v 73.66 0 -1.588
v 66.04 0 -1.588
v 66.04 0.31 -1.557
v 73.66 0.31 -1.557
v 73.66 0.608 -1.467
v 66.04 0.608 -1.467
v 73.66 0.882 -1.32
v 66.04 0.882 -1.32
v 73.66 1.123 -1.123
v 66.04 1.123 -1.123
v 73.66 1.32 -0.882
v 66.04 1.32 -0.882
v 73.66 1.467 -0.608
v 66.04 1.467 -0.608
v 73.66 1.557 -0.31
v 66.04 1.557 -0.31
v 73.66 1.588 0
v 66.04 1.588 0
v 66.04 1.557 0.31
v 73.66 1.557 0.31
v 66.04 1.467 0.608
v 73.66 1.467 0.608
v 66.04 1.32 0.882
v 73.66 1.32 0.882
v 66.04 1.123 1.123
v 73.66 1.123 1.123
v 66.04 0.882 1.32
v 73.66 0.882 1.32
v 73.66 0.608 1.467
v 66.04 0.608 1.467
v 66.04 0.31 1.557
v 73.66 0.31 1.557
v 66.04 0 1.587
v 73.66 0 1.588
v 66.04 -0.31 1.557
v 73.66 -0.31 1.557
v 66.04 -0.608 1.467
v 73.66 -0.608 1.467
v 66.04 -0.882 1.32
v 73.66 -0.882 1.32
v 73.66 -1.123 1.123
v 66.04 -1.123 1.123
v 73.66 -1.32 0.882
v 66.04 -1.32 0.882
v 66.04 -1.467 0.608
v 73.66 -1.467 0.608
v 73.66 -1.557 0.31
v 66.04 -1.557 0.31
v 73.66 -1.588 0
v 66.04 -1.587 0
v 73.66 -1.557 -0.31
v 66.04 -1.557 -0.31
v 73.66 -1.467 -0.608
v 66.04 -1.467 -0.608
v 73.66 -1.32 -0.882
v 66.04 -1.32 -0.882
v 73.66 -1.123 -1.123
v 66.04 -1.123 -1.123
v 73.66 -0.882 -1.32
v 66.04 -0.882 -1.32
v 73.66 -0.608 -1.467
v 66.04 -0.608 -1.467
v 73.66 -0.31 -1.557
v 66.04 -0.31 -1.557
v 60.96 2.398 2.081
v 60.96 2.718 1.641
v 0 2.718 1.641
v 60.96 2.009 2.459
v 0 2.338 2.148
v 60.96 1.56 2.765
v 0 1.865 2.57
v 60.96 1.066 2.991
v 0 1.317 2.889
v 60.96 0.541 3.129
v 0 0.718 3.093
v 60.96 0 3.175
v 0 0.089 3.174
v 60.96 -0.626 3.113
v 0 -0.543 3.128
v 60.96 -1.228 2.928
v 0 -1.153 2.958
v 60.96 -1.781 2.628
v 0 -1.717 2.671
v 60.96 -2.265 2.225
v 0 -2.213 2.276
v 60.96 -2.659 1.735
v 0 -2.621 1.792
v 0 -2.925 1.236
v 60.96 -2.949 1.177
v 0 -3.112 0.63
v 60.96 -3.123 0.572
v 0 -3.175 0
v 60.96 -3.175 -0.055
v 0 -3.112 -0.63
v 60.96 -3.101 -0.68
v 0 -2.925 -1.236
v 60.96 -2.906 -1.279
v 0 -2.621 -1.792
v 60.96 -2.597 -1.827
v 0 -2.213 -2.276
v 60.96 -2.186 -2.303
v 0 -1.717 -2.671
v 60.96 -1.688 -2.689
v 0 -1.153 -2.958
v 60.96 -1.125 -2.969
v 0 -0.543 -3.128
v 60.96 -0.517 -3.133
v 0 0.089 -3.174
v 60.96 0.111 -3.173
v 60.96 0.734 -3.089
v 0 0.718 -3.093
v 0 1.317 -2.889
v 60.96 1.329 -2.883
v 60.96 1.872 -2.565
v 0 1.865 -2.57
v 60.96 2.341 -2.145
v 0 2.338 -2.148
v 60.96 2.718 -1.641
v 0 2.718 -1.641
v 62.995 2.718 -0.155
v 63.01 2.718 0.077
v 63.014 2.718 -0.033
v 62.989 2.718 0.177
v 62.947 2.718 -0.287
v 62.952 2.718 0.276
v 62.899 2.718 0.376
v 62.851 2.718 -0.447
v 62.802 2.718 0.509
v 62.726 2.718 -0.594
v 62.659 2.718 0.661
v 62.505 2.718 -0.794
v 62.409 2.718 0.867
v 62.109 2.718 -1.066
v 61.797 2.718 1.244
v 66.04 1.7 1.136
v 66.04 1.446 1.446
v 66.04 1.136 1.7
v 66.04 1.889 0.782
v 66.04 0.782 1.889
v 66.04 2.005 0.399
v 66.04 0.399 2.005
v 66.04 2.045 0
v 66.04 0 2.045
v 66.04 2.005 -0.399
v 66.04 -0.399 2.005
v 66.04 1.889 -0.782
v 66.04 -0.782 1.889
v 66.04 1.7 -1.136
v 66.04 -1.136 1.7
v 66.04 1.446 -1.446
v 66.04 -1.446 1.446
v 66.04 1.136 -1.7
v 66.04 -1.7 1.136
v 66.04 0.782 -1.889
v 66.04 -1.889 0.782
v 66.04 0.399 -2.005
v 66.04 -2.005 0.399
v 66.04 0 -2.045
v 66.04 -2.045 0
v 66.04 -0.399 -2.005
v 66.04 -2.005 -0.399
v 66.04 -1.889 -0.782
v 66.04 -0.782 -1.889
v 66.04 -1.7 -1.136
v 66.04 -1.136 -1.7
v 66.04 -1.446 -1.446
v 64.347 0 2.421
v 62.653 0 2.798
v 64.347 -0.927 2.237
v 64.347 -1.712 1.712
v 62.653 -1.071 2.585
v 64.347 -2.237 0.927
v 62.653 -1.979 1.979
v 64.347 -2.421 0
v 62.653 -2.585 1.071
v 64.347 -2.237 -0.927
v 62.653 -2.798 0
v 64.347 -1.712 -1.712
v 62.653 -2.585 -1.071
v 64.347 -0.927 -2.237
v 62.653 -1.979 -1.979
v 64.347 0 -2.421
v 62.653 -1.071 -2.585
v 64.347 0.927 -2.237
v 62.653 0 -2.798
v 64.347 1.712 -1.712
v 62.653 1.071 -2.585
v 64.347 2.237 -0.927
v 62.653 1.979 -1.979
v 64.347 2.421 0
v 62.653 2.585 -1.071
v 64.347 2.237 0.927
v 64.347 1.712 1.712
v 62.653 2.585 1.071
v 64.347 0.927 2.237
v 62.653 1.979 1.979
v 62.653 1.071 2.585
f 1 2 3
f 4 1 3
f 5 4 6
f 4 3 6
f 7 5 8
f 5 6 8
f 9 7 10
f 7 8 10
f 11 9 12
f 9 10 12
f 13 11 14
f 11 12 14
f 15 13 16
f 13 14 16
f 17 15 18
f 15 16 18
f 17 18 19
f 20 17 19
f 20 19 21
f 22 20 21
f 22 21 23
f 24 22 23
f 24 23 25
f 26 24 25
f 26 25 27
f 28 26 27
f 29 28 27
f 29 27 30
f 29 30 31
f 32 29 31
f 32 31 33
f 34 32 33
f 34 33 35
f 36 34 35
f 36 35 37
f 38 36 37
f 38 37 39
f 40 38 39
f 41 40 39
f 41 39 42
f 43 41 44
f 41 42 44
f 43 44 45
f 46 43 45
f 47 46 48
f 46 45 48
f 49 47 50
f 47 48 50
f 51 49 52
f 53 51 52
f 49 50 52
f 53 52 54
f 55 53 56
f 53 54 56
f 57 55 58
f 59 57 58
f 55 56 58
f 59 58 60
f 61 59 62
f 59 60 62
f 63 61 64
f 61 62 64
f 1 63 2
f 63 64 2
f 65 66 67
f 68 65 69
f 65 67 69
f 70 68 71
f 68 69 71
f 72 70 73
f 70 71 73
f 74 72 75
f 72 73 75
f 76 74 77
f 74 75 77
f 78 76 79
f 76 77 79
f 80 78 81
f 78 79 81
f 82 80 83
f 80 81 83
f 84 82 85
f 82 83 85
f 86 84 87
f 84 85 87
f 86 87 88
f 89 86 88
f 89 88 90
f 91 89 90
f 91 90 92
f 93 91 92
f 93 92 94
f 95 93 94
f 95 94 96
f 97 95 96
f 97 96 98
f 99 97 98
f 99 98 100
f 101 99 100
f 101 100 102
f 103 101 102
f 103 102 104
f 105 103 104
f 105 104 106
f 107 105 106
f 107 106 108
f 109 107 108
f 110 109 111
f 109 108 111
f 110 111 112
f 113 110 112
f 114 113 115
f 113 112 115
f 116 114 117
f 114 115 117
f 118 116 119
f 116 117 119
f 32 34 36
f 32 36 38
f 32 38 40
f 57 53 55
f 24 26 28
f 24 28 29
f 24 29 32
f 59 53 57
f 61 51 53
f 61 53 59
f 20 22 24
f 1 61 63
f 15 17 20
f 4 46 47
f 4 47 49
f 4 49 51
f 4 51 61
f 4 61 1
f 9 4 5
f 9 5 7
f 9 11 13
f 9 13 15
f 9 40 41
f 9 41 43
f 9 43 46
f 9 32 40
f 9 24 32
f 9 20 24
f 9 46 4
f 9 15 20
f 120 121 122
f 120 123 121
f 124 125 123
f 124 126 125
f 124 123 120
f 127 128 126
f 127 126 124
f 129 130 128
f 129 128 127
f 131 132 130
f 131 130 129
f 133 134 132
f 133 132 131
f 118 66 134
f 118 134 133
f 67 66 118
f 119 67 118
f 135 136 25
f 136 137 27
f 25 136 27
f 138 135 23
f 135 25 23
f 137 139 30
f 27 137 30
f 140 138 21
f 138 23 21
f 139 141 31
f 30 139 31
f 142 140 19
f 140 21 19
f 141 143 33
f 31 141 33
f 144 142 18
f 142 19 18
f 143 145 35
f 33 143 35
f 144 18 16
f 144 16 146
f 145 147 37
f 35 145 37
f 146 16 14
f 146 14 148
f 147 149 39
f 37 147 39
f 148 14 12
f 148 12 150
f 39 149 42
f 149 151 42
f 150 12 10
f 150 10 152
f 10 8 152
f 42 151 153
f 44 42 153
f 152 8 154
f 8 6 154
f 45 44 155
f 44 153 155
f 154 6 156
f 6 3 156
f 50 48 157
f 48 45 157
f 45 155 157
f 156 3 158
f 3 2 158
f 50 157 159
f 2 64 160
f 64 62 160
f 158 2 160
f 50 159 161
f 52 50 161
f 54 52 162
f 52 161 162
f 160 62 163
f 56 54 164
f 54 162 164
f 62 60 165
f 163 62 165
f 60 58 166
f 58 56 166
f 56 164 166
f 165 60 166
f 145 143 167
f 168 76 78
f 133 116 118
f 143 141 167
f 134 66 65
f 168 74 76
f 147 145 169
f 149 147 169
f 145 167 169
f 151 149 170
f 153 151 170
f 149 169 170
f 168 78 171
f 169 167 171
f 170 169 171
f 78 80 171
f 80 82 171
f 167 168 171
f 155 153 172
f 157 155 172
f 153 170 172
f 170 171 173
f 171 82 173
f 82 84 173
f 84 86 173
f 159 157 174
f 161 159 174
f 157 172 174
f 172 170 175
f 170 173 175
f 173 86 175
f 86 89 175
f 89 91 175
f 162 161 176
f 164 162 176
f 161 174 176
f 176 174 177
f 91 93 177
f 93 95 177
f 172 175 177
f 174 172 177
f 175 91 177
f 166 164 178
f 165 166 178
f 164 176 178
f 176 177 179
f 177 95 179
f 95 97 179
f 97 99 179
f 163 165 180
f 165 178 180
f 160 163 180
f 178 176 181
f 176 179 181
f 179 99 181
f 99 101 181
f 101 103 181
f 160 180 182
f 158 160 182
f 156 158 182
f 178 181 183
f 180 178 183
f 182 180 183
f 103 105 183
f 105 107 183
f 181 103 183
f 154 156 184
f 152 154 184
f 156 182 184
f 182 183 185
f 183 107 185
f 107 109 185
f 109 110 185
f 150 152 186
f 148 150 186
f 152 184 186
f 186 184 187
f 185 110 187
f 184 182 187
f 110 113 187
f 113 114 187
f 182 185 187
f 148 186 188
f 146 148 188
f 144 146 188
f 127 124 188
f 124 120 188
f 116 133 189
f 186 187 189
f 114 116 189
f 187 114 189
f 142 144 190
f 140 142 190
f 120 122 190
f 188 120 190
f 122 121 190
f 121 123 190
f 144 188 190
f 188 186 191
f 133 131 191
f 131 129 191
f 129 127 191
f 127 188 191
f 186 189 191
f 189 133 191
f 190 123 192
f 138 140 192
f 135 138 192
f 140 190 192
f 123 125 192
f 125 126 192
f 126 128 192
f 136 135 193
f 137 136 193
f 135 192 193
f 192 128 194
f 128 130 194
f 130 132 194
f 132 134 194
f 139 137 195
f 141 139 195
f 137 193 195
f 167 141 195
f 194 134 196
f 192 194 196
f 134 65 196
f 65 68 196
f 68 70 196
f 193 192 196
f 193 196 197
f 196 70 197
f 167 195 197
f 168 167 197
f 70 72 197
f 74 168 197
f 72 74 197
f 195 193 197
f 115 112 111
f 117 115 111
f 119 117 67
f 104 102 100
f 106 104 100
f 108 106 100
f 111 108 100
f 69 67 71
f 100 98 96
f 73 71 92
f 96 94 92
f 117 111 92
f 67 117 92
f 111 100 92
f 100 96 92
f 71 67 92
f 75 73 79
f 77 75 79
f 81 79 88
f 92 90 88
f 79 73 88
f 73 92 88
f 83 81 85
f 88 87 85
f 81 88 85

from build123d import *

# Parameters (mm, degrees)
SKETCH1_R           = 3.175
BOSS_EXTRUDE1_DEPTH = 60.96
SKETCH2_R           = 1.5875
BOSS_EXTRUDE2_DEPTH = 12.7
CUT_EXTRUDE1_DEPTH  = 74.796726553


with BuildPart() as part:
    # Sketch1 → Boss-Extrude1 (new body)
    with BuildSketch(Plane(origin=(0, 0, 0), x_dir=(0, 0, -1), z_dir=(1, 0, 0))):
        with Locations(Location((0, 0, 0), (0, 0, 180))):
            Circle(SKETCH1_R)
    extrude(amount=BOSS_EXTRUDE1_DEPTH)

    # Sketch2 → Boss-Extrude2 (add)
    with BuildSketch(Plane(origin=(60.96, 0, 0), x_dir=(0, 0, -1), z_dir=(1, 0, 0))):
        Circle(SKETCH2_R)
    extrude(amount=BOSS_EXTRUDE2_DEPTH)

    # Sketch4 → Revolve1 (revolve)
    with BuildSketch(Plane.XY, mode=Mode.PRIVATE) as revolve1_sk:
        Polygon((60.96, -1.5875), (66.04, -1.5875), (66.04, -2.0447), (60.96, -3.175), align=None)
    revolve(revolve1_sk.sketch.rotate(Axis((60.96, 0, 0), (1, 0, 0)), 270), axis=Axis((60.96, 0, 0), (1, 0, 0)))

    # Sketch3 → Cut-Extrude1 (cut, through all)
    with BuildSketch(Plane.ZY):
        with BuildLine():
            Line((1.641398233, 2.7178), (-1.641398233, 2.7178))
            ThreePointArc((-1.641398233, 2.7178), (0, 3.175), (1.641398233, 2.7178))
        make_face()
    extrude(amount=-CUT_EXTRUDE1_DEPTH, mode=Mode.SUBTRACT)


solid = part.part
